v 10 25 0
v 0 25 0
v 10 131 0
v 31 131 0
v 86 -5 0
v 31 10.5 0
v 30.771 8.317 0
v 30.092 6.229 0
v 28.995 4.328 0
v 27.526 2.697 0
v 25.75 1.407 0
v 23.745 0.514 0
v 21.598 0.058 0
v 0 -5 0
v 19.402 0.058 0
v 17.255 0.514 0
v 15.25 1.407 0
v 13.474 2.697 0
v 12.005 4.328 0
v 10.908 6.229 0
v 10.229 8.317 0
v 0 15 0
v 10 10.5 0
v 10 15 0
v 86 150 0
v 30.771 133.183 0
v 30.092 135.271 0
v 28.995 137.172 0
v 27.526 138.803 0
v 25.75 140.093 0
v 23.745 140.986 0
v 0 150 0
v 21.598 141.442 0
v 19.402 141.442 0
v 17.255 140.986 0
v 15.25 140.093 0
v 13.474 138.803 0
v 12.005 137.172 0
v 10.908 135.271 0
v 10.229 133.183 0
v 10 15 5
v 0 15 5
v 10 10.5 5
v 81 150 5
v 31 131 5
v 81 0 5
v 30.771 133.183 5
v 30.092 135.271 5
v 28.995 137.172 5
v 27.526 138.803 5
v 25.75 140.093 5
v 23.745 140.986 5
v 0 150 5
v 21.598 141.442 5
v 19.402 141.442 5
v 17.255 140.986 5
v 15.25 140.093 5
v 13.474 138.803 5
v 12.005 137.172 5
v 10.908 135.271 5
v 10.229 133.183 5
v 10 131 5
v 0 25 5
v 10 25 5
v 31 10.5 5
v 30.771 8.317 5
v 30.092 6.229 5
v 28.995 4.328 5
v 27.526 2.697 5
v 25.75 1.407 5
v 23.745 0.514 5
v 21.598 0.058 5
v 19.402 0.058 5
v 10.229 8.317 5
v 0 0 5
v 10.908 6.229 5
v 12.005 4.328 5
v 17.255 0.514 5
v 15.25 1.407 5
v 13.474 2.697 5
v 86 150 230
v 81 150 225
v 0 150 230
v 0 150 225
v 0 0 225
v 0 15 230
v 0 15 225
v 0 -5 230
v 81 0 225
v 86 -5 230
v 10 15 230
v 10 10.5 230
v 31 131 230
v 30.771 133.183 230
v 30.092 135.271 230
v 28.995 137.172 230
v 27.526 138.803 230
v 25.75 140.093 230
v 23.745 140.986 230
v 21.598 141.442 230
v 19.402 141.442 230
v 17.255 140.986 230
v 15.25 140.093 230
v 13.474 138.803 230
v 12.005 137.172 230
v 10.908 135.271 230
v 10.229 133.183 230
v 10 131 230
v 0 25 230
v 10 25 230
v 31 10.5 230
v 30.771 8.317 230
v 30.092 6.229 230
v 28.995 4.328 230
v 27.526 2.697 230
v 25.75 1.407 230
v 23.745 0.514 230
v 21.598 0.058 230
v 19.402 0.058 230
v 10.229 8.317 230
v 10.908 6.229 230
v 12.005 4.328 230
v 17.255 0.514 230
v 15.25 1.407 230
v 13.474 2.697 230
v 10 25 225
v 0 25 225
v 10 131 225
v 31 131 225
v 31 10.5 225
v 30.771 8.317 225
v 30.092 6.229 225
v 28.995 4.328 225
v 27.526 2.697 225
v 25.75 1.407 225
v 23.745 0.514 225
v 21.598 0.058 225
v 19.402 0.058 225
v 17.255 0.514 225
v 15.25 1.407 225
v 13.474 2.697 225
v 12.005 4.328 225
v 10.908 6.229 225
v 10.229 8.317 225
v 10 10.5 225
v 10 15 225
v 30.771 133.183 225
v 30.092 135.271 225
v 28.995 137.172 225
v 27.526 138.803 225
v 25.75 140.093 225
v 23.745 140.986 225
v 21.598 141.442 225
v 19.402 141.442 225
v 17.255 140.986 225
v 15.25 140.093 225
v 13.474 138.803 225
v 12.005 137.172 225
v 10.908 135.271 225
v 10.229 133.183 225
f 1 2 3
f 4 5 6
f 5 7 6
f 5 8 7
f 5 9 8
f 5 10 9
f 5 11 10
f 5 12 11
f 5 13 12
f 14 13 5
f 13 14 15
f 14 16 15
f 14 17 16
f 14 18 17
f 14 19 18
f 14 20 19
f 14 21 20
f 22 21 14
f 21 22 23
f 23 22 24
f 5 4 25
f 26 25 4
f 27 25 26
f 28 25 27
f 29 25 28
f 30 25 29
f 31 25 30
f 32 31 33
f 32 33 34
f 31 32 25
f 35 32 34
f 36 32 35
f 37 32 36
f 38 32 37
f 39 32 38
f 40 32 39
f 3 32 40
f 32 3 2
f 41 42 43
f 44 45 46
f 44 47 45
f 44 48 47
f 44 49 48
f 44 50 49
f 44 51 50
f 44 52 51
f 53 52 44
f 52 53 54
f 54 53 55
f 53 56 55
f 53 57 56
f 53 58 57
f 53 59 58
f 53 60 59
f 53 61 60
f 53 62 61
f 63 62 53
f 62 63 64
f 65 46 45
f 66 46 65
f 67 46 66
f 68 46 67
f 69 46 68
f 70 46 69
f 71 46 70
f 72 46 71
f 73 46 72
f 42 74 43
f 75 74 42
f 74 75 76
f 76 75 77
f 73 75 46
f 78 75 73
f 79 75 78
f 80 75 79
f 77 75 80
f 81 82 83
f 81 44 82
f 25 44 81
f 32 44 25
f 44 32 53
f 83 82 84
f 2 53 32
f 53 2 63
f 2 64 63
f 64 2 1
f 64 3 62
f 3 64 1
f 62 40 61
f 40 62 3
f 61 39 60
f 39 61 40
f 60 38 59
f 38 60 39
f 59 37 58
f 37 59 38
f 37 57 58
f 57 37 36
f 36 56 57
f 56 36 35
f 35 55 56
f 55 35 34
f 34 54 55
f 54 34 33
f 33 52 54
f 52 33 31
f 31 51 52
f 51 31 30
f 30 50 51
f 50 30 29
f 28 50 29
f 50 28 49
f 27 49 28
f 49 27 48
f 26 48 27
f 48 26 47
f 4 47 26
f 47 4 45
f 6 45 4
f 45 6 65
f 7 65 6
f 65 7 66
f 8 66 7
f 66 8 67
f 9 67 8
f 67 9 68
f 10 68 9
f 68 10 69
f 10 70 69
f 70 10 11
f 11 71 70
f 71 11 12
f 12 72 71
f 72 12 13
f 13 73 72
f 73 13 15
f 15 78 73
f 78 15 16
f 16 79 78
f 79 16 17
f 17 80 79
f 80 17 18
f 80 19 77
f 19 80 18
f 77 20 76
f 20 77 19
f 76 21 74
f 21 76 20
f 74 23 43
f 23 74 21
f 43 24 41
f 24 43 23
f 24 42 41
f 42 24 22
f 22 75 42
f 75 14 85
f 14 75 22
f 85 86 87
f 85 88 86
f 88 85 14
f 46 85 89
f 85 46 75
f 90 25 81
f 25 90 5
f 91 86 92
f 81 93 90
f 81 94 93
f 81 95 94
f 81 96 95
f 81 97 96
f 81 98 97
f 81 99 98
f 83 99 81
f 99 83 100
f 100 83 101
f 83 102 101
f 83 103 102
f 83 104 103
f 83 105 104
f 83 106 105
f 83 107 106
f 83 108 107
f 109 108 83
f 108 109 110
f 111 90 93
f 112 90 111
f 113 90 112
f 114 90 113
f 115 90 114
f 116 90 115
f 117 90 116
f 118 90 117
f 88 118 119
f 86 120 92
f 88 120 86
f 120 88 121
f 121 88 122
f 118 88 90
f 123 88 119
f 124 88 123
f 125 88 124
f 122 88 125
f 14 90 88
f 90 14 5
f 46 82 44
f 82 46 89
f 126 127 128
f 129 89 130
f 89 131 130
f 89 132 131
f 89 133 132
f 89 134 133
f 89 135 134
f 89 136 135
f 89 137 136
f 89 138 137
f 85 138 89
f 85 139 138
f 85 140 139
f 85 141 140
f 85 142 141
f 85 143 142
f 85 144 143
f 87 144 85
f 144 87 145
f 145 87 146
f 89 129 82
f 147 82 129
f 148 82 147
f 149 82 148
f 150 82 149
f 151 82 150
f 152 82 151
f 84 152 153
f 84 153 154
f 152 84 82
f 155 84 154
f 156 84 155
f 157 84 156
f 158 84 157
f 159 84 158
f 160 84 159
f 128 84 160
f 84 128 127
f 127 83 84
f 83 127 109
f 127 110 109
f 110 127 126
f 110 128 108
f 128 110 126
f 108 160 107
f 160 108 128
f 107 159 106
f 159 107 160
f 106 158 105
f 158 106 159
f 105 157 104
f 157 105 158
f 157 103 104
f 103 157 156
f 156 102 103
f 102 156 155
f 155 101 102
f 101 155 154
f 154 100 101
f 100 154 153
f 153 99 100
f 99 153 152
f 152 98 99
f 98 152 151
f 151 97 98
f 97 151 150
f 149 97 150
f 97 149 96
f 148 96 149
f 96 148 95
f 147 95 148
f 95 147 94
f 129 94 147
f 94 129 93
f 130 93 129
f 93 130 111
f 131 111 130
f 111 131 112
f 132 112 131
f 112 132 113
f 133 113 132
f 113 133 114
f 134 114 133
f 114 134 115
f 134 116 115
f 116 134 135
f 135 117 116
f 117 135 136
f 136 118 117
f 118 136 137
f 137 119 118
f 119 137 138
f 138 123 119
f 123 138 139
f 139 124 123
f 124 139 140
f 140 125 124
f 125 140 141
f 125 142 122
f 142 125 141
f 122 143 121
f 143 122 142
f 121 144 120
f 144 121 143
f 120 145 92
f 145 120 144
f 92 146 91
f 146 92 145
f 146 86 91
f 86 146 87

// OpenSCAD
tloustka_dreva = 5;
u_matrace = 10;
sirka_bocnice = 21;
uzitecna_sirka = 50;
vyska_bocnice = 141.5;
pod_bocnici = 0;
vyska = 150;
hloubka_dilu = u_matrace + sirka_bocnice + uzitecna_sirka + tloustka_dreva;
sirka_policky = 230;

module bocnice(){
   rost = 10;
   sirka_rostu = 100;
   dole = 25 - rost/2;
   translate([sirka_bocnice/2, sirka_bocnice/2, 0])circle(sirka_bocnice/2);
   translate([sirka_bocnice/2, vyska_bocnice-sirka_bocnice/2, 0])circle(sirka_bocnice/2);
   translate([0,sirka_bocnice/2,0])square([sirka_bocnice, vyska_bocnice-sirka_bocnice]);
   translate([-sirka_rostu/2,dole,0])square([sirka_rostu,rost],center=true);
}

module bocni_dil_2d(){
   difference() {
      square([hloubka_dilu, vyska]);
      translate([u_matrace, pod_bocnici,0])bocnice();
   }
}

module bocni_dil(){
    linear_extrude(height=tloustka_dreva){
        bocni_dil_2d();
    }
}


module policka(){
    bocni_dil();
    translate([0,-tloustka_dreva,0])
        cube([hloubka_dilu, tloustka_dreva, sirka_policky]);
    translate([hloubka_dilu - tloustka_dreva, 0, 0])
        cube([tloustka_dreva, vyska, sirka_policky]);
    translate([0, 0, sirka_policky-tloustka_dreva])
        bocni_dil();

}

policka();
